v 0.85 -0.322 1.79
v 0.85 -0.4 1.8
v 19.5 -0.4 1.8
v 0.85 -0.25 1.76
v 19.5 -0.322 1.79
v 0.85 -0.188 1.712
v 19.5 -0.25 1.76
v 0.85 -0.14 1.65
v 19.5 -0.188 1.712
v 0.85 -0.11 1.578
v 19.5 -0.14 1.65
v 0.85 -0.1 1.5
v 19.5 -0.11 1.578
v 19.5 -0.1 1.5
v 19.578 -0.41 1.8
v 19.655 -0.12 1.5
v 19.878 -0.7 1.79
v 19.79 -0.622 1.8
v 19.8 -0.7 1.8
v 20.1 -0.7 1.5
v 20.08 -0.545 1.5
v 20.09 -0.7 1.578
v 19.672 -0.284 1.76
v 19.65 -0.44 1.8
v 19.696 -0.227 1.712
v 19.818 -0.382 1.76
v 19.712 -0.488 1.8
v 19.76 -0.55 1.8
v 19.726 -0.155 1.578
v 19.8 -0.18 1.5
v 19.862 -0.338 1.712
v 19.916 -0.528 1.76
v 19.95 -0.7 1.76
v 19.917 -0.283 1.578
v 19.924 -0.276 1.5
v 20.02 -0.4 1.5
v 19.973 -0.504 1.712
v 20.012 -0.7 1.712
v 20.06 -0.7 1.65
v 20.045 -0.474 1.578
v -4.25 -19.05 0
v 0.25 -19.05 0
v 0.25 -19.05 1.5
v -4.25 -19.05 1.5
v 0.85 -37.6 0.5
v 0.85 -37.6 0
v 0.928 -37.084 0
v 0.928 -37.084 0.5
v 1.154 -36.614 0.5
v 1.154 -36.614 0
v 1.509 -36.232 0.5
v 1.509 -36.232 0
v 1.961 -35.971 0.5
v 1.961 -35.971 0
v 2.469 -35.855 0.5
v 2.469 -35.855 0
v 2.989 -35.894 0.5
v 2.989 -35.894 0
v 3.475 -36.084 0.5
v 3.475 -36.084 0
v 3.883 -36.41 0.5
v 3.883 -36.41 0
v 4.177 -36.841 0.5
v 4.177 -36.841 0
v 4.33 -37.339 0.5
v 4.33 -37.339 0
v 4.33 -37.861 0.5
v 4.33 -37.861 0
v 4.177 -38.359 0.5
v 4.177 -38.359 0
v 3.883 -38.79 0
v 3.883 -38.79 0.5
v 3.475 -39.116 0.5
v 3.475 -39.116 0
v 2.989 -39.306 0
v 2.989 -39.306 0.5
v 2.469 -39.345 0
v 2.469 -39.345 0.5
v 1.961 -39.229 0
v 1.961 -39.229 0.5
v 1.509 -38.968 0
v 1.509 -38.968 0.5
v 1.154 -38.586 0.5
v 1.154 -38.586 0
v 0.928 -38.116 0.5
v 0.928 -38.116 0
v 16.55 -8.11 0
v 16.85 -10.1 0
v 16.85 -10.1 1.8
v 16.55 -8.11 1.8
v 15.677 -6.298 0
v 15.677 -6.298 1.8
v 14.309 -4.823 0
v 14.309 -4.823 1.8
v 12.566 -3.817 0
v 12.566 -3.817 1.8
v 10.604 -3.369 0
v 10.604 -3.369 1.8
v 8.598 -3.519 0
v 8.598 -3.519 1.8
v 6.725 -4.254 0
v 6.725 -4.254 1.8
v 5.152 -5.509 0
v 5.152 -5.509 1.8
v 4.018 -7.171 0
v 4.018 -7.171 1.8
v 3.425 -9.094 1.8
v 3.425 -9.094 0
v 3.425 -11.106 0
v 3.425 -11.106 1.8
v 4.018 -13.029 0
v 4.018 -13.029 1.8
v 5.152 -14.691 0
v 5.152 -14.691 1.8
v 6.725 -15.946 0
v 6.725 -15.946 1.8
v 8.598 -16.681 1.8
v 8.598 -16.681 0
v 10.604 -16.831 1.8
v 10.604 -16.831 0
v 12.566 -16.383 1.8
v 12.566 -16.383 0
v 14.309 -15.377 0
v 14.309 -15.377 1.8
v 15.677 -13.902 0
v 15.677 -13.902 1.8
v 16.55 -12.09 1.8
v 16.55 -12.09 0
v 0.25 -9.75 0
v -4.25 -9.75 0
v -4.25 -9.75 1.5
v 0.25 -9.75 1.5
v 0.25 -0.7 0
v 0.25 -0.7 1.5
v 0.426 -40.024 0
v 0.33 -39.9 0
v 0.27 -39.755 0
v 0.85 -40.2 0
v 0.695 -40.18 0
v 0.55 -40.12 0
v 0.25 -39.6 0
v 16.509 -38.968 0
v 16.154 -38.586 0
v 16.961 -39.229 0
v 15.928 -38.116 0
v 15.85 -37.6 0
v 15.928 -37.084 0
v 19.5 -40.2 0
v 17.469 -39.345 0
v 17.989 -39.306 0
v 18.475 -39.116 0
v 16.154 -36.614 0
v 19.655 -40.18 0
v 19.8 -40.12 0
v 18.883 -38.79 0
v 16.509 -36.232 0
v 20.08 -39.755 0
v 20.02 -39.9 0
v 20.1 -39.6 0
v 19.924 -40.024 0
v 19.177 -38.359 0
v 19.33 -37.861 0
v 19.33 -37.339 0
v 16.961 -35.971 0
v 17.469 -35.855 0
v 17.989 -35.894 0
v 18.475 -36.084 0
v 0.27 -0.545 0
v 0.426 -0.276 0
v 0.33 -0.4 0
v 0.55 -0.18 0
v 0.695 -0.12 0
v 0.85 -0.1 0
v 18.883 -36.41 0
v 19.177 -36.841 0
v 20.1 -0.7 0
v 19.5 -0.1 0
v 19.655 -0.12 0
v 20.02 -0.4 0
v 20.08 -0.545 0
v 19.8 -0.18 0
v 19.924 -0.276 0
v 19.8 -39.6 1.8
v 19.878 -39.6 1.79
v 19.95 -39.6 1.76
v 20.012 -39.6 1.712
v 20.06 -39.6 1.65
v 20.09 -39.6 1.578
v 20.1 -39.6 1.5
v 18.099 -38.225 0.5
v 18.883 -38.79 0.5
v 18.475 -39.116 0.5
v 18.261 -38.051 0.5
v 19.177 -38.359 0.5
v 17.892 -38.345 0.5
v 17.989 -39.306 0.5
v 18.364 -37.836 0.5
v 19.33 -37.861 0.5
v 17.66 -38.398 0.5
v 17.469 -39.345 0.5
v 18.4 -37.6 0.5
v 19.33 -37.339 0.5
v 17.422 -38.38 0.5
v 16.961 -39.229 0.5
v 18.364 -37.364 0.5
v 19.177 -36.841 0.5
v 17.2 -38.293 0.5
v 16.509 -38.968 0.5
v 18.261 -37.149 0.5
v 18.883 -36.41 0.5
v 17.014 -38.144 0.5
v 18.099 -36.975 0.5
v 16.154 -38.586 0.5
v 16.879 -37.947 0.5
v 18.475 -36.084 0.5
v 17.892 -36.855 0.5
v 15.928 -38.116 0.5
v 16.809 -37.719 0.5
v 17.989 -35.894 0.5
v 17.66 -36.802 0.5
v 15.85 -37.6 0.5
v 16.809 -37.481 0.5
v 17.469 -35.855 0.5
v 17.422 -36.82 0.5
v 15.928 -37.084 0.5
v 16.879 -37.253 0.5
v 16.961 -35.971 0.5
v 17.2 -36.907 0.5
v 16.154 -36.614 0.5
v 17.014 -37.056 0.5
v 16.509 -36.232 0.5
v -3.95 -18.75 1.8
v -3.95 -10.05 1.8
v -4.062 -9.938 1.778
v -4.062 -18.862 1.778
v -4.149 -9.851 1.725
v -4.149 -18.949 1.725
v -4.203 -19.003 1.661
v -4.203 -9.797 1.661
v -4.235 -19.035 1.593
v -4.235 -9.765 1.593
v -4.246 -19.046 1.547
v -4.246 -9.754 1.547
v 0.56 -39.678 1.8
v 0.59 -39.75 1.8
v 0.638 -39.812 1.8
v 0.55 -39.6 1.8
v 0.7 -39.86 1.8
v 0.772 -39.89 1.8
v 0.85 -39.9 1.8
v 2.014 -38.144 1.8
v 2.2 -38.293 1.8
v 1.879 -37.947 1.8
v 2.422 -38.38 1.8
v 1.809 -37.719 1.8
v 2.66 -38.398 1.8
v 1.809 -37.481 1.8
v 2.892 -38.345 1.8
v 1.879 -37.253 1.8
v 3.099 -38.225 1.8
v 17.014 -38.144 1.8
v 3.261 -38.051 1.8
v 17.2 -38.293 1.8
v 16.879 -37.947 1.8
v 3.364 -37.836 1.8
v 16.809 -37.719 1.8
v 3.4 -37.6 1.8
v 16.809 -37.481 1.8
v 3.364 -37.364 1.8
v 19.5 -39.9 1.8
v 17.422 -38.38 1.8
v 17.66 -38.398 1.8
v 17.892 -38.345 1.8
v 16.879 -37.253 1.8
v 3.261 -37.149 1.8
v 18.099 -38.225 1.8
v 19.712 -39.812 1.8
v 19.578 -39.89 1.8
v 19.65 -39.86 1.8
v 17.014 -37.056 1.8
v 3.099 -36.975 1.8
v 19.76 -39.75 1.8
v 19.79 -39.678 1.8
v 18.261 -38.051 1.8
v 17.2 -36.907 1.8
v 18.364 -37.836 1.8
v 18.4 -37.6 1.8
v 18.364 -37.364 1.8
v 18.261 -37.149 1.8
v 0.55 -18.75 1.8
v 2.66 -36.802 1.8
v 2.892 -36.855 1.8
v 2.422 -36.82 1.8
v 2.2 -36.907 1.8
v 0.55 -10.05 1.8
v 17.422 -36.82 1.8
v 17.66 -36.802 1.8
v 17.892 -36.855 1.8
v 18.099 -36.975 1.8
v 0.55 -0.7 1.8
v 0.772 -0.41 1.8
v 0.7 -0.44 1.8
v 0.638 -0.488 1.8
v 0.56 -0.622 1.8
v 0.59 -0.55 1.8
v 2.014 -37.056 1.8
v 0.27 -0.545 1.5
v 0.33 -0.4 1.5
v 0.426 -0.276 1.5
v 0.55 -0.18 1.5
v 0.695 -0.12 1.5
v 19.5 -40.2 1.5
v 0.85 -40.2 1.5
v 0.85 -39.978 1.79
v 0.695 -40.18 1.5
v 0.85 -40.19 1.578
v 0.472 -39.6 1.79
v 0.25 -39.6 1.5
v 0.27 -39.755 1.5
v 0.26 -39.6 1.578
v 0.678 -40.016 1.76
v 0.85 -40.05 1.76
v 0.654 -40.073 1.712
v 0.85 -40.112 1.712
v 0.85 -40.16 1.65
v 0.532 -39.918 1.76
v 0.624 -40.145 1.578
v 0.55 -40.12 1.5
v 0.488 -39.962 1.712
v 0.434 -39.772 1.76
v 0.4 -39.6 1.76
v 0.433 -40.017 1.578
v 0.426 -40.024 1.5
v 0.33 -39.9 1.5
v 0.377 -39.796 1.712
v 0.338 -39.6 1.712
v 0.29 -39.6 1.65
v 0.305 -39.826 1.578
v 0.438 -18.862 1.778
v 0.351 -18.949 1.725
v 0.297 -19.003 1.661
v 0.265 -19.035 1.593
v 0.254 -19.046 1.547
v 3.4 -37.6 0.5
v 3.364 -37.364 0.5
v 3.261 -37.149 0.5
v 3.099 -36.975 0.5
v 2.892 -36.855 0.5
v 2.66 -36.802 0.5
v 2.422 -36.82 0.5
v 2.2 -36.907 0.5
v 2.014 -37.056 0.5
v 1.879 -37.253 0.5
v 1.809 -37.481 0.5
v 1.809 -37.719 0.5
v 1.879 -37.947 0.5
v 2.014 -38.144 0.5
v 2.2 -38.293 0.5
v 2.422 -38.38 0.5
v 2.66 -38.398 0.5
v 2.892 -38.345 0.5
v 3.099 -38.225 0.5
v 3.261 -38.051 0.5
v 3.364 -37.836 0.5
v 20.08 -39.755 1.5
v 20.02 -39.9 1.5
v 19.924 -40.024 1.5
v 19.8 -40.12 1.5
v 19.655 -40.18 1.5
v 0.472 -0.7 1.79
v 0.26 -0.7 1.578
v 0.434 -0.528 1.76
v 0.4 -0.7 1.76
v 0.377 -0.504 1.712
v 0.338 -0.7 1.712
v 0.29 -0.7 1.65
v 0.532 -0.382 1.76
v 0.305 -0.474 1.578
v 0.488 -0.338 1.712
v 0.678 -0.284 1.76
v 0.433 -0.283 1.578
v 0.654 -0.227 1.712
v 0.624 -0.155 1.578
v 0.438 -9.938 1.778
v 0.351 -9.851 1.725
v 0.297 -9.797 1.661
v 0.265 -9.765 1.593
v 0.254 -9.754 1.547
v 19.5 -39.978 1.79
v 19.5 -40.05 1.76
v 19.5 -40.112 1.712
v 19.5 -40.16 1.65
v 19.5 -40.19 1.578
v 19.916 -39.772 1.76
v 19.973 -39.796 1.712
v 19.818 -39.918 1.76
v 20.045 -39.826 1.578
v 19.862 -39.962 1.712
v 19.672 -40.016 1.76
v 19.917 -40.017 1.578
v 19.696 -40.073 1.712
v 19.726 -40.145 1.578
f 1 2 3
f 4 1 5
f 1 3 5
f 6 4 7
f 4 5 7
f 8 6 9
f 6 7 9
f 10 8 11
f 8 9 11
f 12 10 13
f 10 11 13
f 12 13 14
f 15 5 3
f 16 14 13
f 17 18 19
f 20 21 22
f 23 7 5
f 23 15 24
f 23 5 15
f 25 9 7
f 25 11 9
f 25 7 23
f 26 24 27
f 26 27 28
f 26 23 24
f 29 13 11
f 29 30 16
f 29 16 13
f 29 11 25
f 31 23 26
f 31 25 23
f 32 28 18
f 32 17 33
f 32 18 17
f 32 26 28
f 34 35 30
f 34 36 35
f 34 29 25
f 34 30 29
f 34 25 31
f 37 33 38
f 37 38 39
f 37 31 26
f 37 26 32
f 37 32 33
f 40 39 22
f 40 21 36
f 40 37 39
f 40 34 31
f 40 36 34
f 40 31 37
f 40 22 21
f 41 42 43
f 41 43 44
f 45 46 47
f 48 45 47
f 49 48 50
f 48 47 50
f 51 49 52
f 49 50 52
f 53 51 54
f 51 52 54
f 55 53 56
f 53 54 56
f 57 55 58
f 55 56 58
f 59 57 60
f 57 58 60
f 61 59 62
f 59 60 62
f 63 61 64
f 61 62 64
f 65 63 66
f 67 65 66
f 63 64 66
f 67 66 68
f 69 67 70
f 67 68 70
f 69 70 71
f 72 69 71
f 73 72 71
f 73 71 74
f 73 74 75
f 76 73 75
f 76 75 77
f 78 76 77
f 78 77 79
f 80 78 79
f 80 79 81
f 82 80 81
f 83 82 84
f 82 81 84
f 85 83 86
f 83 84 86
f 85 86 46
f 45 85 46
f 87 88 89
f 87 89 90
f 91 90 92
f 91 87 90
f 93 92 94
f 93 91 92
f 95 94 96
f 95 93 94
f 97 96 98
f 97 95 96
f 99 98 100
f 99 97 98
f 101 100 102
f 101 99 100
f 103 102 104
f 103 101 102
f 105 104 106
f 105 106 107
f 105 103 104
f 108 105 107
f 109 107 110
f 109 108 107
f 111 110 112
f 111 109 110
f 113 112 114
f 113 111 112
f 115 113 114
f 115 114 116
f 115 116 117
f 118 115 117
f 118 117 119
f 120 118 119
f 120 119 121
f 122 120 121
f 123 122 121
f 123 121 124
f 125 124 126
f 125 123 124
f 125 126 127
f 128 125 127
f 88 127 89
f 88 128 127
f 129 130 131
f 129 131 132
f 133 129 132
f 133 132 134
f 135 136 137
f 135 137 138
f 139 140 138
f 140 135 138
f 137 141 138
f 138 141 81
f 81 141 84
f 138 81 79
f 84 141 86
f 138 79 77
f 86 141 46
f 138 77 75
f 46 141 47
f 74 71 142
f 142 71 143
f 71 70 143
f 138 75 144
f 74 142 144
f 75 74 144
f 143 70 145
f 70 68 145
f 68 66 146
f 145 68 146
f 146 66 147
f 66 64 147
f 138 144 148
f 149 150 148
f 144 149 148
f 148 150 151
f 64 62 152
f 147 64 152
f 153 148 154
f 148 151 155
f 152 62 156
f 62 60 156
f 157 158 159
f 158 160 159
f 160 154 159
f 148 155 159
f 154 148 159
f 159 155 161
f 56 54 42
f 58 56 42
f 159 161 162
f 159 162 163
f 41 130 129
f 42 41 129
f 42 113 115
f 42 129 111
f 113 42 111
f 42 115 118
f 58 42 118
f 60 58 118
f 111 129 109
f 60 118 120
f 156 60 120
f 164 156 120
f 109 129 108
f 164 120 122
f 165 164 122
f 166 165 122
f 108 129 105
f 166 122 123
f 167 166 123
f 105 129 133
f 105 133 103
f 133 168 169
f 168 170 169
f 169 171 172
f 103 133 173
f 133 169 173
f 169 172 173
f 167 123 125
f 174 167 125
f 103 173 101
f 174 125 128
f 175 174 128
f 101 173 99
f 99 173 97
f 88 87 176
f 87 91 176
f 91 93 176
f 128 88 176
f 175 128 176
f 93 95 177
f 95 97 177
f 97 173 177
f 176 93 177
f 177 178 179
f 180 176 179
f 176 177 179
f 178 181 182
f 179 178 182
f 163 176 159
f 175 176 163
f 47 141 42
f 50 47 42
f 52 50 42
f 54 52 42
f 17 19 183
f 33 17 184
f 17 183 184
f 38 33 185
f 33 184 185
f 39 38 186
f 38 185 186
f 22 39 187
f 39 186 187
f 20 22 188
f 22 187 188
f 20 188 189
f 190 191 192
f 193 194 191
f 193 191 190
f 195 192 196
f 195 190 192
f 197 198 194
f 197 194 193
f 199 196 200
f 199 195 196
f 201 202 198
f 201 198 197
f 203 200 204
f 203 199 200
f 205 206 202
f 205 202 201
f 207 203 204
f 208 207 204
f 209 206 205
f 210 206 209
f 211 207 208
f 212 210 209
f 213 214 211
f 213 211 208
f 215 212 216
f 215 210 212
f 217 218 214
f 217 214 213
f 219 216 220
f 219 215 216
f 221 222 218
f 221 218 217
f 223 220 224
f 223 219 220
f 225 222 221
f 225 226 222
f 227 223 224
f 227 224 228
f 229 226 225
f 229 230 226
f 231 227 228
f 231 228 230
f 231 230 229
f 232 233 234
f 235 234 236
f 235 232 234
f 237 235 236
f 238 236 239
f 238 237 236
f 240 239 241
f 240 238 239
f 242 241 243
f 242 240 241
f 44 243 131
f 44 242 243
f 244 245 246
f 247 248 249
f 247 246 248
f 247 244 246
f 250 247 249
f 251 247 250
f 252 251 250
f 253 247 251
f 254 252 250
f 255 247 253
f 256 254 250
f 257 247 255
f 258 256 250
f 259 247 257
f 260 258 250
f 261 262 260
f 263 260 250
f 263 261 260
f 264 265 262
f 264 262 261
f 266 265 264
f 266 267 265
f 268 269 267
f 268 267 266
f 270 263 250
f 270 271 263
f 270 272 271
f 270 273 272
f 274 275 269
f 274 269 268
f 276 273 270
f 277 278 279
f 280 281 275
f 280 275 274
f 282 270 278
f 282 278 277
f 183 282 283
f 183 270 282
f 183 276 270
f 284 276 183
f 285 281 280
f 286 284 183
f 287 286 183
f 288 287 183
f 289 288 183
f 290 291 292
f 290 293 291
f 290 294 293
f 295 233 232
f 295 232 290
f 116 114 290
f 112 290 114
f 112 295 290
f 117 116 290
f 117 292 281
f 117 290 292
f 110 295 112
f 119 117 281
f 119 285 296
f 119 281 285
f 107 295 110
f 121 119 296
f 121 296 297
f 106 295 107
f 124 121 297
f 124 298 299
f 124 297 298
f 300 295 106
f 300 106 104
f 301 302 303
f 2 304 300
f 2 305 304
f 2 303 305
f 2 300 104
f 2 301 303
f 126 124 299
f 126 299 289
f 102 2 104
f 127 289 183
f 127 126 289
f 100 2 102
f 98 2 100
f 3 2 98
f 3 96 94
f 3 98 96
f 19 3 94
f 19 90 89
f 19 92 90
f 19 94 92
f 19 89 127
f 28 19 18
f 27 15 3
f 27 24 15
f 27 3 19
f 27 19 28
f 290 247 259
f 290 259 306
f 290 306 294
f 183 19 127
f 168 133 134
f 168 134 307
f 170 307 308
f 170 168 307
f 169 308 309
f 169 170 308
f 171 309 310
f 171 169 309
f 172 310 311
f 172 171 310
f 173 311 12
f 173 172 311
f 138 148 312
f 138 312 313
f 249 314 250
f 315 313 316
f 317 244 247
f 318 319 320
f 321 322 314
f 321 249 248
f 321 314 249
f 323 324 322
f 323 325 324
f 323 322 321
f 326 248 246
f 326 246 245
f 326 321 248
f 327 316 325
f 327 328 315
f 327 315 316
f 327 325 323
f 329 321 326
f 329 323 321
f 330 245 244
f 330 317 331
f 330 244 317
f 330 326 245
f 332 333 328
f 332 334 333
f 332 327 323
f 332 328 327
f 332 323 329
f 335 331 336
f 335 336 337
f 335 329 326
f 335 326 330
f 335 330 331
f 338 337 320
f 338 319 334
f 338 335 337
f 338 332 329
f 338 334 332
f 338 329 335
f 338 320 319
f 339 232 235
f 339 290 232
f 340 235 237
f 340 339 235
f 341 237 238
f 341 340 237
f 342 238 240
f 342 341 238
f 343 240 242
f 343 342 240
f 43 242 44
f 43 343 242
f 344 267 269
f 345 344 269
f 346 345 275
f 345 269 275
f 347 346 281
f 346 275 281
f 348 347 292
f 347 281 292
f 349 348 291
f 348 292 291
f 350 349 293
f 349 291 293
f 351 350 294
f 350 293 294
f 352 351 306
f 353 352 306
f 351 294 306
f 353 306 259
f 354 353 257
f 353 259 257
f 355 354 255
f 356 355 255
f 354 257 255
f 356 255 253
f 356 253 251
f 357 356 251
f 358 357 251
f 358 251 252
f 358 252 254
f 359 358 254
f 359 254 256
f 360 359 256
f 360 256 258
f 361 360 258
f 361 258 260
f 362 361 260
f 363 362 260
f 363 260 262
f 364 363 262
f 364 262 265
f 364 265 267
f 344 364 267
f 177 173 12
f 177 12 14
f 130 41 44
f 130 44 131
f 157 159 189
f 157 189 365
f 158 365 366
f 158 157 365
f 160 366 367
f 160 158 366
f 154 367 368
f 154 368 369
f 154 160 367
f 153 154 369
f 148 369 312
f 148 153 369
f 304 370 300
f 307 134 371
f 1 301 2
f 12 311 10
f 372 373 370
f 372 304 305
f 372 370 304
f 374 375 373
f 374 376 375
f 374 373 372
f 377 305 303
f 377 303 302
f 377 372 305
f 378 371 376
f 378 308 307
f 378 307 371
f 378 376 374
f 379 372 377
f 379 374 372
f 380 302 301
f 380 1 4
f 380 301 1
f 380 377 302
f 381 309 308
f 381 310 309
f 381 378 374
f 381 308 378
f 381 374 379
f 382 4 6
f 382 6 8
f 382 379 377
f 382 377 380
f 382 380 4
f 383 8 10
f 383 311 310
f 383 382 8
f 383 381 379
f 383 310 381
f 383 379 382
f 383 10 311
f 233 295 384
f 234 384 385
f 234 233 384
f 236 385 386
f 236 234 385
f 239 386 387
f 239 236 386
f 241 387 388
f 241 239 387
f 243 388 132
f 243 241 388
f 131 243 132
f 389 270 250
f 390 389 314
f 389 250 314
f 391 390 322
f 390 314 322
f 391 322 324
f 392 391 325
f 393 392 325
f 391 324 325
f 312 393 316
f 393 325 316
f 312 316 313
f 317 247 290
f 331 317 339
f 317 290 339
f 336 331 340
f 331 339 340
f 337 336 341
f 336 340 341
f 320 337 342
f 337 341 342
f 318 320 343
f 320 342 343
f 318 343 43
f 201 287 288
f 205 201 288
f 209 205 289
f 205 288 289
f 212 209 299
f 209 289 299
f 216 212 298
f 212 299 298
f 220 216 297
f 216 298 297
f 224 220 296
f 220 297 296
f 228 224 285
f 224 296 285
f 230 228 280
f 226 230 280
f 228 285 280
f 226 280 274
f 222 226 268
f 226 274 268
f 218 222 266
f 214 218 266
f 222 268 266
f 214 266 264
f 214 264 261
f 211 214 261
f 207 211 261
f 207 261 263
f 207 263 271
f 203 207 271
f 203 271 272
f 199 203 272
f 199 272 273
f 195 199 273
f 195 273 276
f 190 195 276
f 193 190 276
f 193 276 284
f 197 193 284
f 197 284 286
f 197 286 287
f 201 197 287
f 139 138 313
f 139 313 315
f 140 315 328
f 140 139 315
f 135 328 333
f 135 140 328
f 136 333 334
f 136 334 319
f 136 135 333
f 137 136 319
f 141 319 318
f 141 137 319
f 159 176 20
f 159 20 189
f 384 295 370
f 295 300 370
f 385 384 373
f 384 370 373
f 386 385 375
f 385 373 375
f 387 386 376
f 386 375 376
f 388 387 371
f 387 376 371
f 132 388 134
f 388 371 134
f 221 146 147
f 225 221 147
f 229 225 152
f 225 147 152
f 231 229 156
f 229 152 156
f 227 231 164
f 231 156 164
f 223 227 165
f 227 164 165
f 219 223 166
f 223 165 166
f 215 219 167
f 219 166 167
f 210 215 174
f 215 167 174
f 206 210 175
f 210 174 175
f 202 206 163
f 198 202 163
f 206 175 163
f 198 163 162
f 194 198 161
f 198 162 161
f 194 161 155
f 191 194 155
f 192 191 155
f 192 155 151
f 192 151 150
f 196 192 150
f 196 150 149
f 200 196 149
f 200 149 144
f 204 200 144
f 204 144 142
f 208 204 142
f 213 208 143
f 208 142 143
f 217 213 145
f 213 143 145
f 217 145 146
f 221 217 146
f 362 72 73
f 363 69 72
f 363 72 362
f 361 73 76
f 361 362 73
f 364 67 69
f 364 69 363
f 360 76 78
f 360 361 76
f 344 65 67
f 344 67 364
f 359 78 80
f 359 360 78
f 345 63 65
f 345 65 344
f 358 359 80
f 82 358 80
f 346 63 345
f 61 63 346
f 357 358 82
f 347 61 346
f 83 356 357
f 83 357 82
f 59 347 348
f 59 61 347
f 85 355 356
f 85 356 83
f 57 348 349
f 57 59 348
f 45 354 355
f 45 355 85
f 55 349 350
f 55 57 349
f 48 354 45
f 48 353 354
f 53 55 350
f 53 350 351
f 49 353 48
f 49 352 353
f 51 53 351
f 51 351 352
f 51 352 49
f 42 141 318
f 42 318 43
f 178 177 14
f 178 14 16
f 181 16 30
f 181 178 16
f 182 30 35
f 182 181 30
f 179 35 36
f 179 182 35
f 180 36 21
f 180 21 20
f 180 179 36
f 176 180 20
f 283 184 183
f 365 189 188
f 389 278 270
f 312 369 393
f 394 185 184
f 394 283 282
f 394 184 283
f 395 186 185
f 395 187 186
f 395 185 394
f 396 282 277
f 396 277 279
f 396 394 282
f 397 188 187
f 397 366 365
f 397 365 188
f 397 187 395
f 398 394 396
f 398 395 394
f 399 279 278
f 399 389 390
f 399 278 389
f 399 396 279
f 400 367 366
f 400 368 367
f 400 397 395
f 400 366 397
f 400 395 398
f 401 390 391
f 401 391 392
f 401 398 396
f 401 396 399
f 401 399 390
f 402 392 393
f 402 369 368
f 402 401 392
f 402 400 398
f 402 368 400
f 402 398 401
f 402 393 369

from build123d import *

# Parameters (mm, degrees)
SKETCH_1_R          = 6.75
EXTRUDE_1_DEPTH     = 1.8
SKETCH_2_R          = 0.8
CUT_EXTRUDE_1_DEPTH = 2
SKETCH_3_R          = 1.75
CUT_EXTRUDE_2_DEPTH = 0.5
SKETCH_4_W          = 4.5
SKETCH_4_H          = 9.8
EXTRUDE_2_DEPTH     = 1.8
SKETCH_5_R          = 1.75
EXTRUDE_3_DEPTH     = 1.3
SKETCH_6_R          = 1.75
EXTRUDE_4_DEPTH     = 1.8
EXTRUDE_5_DEPTH     = 1.8
CUT_EXTRUDE_3_DEPTH = 10
FILLET_1_R          = 0.7
CUT_EXTRUDE_4_DEPTH = 10
FILLET_2_R          = 0.3


with BuildPart() as part:
    # 草图1 → 凸台-拉伸1 (new body)
    with BuildSketch(Plane.XY):
        with BuildLine():
            Line((0.7, 0), (19.5, 0))
            ThreePointArc((19.5, 0), (19.994974747, -0.205025253), (20.2, -0.7))
            Line((20.2, -0.7), (20.2, -39.6))
            ThreePointArc((20.2, -39.6), (19.994974747, -40.094974747), (19.5, -40.3))
            Line((19.5, -40.3), (0.7, -40.3))
            ThreePointArc((0.7, -40.3), (0.205025253, -40.094974747), (0, -39.6))
            Line((0, -39.6), (0, -0.7))
            ThreePointArc((0, -0.7), (0.205025253, -0.205025253), (0.7, 0))
        make_face()
        with Locations((10.1, -10.1)):
            Circle(SKETCH_1_R, mode=Mode.SUBTRACT)
    extrude(amount=EXTRUDE_1_DEPTH)

    # 草图2 → 切除-拉伸1 (cut)
    with BuildSketch(Plane.XY.offset(1.8)):
        with Locations((17.6, -2.6)):
            Circle(SKETCH_2_R)
        with Locations((17.6, -37.6)):
            Circle(SKETCH_2_R)
        with Locations((2.6, -37.6)):
            Circle(SKETCH_2_R)
        with Locations((2.6, -2.6)):
            Circle(SKETCH_2_R)
    extrude(amount=-CUT_EXTRUDE_1_DEPTH, mode=Mode.SUBTRACT)

    # 草图3 → 切除-拉伸2 (cut)
    with BuildSketch(Plane(origin=(0, 0, 0), x_dir=(-1, 0, 0), z_dir=(0, 0, -1))):
        with Locations((-17.6, -2.6)):
            Circle(SKETCH_3_R)
        with Locations((-2.6, -2.6)):
            Circle(SKETCH_3_R)
        with Locations((-17.6, -37.6)):
            Circle(SKETCH_3_R)
        with Locations((-2.6, -37.6)):
            Circle(SKETCH_3_R)
    extrude(amount=-CUT_EXTRUDE_2_DEPTH, mode=Mode.SUBTRACT)

    # 草图4 → 凸台-拉伸2 (add)
    with BuildSketch(Plane(origin=(0, 0, 0), x_dir=(-1, 0, 0), z_dir=(0, 0, -1))):
        with Locations((2.25, -14.4)):
            Rectangle(SKETCH_4_W, SKETCH_4_H)
    extrude(amount=-EXTRUDE_2_DEPTH)

    # 草图5 → 凸台-拉伸3 (add)
    with BuildSketch(Plane(origin=(0, 0, 0.5), x_dir=(-1, 0, 0), z_dir=(0, 0, -1))):
        with Locations((-2.6, -2.6)):
            Circle(SKETCH_5_R)
        with Locations((-17.6, -2.6)):
            Circle(SKETCH_5_R)
    extrude(amount=-EXTRUDE_3_DEPTH)

    # 草图6 → 凸台-拉伸4 (add)
    with BuildSketch(Plane(origin=(0, 0, 0), x_dir=(-1, 0, 0), z_dir=(0, 0, -1))):
        with Locations((-17.6, -2.6)):
            Circle(SKETCH_6_R)
        with Locations((-2.6, -2.6)):
            Circle(SKETCH_6_R)
    extrude(amount=-EXTRUDE_4_DEPTH)

    # 草图8 → 凸台-拉伸5 (add)
    with BuildSketch(Plane(origin=(0, 0, 0), x_dir=(-1, 0, 0), z_dir=(0, 0, -1))):
        Polygon((-0.7, 0), (0, 0), (0, -0.7), align=None)
        Polygon((-0.7, -40.3), (0, -40.3), (0, -39.6), align=None)
    extrude(amount=-EXTRUDE_5_DEPTH)

    # 草图9 → 切除-拉伸3 (cut)
    with BuildSketch(Plane(origin=(0, 0, 0), x_dir=(-1, 0, 0), z_dir=(0, 0, -1))):
        Polygon((0, -19.3), (0, -40.3), (-0.15, -40.3), (-0.15, -19.15), (4.35, -19.15), (4.35, -9.65), (-0.15, -9.65), (-0.15, 0), (0, 0), (0, -9.5), (4.5, -9.5), (4.5, -19.3), align=None)
    extrude(amount=-CUT_EXTRUDE_3_DEPTH, mode=Mode.SUBTRACT)

    # 圆角1
    fillet_1_edges = [part.edges().sort_by_distance(p)[0] for p in [
        (0.15, -40.3, 0.9),
        (0.15, 0, 0.9),
    ]]
    fillet(fillet_1_edges, radius=FILLET_1_R)

    # 草图10 → 切除-拉伸4 (cut)
    with BuildSketch(Plane(origin=(0, 0, 0), x_dir=(-1, 0, 0), z_dir=(0, 0, -1))):
        with BuildLine():
            ThreePointArc((-20.2, -39.6), (-19.994974747, -40.094974747), (-19.5, -40.3))
            Line((-19.5, -40.3), (-0.85, -40.3))
            ThreePointArc((-0.85, -40.3), (-0.355025253, -40.094974747), (-0.15, -39.6))
            Line((-0.15, -39.6), (-0.15, -19.15))
            Line((-0.15, -19.15), (4.35, -19.15))
            Line((4.35, -19.15), (4.35, -9.65))
            Line((4.35, -9.65), (-0.15, -9.65))
            Line((-0.15, -9.65), (-0.15, -0.7))
            ThreePointArc((-0.15, -0.7), (-0.355025253, -0.205025253), (-0.85, 0))
            Line((-0.85, 0), (-19.5, 0))
            ThreePointArc((-19.5, 0), (-19.994974747, -0.205025253), (-20.2, -0.7))
            Line((-20.2, -0.7), (-20.2, -39.6))
        make_face()
        with BuildLine():
            ThreePointArc((-20.1, -39.6), (-19.924264069, -40.024264069), (-19.5, -40.2))
            Line((-19.5, -40.2), (-0.85, -40.2))
            ThreePointArc((-0.85, -40.2), (-0.425735931, -40.024264069), (-0.25, -39.6))
            Line((-0.25, -39.6), (-0.25, -19.05))
            Line((-0.25, -19.05), (4.25, -19.05))
            Line((4.25, -19.05), (4.25, -9.75))
            Line((4.25, -9.75), (-0.25, -9.75))
            Line((-0.25, -9.75), (-0.25, -0.7))
            ThreePointArc((-0.25, -0.7), (-0.425735931, -0.275735931), (-0.85, -0.1))
            Line((-0.85, -0.1), (-19.5, -0.1))
            ThreePointArc((-19.5, -0.1), (-19.924264069, -0.275735931), (-20.1, -0.7))
            Line((-20.1, -0.7), (-20.1, -39.6))
        make_face(mode=Mode.SUBTRACT)
    extrude(amount=-CUT_EXTRUDE_4_DEPTH, mode=Mode.SUBTRACT)

    # 圆角2
    fillet_2_edges = [part.edges().sort_by_distance(p)[0] for p in [
        (19.924264069, -40.024264069, 1.8),
        (10.175, -40.2, 1.8),
        (0.425735931, -40.024264069, 1.8),
        (0.25, -29.325, 1.8),
        (-2, -19.05, 1.8),
        (-4.25, -14.4, 1.8),
        (-2, -9.75, 1.8),
        (0.25, -5.225, 1.8),
        (0.425735931, -0.275735931, 1.8),
        (10.175, -0.1, 1.8),
        (19.924264069, -0.275735931, 1.8),
        (20.1, -20.15, 1.8),
    ]]
    fillet(fillet_2_edges, radius=FILLET_2_R)


solid = part.part
